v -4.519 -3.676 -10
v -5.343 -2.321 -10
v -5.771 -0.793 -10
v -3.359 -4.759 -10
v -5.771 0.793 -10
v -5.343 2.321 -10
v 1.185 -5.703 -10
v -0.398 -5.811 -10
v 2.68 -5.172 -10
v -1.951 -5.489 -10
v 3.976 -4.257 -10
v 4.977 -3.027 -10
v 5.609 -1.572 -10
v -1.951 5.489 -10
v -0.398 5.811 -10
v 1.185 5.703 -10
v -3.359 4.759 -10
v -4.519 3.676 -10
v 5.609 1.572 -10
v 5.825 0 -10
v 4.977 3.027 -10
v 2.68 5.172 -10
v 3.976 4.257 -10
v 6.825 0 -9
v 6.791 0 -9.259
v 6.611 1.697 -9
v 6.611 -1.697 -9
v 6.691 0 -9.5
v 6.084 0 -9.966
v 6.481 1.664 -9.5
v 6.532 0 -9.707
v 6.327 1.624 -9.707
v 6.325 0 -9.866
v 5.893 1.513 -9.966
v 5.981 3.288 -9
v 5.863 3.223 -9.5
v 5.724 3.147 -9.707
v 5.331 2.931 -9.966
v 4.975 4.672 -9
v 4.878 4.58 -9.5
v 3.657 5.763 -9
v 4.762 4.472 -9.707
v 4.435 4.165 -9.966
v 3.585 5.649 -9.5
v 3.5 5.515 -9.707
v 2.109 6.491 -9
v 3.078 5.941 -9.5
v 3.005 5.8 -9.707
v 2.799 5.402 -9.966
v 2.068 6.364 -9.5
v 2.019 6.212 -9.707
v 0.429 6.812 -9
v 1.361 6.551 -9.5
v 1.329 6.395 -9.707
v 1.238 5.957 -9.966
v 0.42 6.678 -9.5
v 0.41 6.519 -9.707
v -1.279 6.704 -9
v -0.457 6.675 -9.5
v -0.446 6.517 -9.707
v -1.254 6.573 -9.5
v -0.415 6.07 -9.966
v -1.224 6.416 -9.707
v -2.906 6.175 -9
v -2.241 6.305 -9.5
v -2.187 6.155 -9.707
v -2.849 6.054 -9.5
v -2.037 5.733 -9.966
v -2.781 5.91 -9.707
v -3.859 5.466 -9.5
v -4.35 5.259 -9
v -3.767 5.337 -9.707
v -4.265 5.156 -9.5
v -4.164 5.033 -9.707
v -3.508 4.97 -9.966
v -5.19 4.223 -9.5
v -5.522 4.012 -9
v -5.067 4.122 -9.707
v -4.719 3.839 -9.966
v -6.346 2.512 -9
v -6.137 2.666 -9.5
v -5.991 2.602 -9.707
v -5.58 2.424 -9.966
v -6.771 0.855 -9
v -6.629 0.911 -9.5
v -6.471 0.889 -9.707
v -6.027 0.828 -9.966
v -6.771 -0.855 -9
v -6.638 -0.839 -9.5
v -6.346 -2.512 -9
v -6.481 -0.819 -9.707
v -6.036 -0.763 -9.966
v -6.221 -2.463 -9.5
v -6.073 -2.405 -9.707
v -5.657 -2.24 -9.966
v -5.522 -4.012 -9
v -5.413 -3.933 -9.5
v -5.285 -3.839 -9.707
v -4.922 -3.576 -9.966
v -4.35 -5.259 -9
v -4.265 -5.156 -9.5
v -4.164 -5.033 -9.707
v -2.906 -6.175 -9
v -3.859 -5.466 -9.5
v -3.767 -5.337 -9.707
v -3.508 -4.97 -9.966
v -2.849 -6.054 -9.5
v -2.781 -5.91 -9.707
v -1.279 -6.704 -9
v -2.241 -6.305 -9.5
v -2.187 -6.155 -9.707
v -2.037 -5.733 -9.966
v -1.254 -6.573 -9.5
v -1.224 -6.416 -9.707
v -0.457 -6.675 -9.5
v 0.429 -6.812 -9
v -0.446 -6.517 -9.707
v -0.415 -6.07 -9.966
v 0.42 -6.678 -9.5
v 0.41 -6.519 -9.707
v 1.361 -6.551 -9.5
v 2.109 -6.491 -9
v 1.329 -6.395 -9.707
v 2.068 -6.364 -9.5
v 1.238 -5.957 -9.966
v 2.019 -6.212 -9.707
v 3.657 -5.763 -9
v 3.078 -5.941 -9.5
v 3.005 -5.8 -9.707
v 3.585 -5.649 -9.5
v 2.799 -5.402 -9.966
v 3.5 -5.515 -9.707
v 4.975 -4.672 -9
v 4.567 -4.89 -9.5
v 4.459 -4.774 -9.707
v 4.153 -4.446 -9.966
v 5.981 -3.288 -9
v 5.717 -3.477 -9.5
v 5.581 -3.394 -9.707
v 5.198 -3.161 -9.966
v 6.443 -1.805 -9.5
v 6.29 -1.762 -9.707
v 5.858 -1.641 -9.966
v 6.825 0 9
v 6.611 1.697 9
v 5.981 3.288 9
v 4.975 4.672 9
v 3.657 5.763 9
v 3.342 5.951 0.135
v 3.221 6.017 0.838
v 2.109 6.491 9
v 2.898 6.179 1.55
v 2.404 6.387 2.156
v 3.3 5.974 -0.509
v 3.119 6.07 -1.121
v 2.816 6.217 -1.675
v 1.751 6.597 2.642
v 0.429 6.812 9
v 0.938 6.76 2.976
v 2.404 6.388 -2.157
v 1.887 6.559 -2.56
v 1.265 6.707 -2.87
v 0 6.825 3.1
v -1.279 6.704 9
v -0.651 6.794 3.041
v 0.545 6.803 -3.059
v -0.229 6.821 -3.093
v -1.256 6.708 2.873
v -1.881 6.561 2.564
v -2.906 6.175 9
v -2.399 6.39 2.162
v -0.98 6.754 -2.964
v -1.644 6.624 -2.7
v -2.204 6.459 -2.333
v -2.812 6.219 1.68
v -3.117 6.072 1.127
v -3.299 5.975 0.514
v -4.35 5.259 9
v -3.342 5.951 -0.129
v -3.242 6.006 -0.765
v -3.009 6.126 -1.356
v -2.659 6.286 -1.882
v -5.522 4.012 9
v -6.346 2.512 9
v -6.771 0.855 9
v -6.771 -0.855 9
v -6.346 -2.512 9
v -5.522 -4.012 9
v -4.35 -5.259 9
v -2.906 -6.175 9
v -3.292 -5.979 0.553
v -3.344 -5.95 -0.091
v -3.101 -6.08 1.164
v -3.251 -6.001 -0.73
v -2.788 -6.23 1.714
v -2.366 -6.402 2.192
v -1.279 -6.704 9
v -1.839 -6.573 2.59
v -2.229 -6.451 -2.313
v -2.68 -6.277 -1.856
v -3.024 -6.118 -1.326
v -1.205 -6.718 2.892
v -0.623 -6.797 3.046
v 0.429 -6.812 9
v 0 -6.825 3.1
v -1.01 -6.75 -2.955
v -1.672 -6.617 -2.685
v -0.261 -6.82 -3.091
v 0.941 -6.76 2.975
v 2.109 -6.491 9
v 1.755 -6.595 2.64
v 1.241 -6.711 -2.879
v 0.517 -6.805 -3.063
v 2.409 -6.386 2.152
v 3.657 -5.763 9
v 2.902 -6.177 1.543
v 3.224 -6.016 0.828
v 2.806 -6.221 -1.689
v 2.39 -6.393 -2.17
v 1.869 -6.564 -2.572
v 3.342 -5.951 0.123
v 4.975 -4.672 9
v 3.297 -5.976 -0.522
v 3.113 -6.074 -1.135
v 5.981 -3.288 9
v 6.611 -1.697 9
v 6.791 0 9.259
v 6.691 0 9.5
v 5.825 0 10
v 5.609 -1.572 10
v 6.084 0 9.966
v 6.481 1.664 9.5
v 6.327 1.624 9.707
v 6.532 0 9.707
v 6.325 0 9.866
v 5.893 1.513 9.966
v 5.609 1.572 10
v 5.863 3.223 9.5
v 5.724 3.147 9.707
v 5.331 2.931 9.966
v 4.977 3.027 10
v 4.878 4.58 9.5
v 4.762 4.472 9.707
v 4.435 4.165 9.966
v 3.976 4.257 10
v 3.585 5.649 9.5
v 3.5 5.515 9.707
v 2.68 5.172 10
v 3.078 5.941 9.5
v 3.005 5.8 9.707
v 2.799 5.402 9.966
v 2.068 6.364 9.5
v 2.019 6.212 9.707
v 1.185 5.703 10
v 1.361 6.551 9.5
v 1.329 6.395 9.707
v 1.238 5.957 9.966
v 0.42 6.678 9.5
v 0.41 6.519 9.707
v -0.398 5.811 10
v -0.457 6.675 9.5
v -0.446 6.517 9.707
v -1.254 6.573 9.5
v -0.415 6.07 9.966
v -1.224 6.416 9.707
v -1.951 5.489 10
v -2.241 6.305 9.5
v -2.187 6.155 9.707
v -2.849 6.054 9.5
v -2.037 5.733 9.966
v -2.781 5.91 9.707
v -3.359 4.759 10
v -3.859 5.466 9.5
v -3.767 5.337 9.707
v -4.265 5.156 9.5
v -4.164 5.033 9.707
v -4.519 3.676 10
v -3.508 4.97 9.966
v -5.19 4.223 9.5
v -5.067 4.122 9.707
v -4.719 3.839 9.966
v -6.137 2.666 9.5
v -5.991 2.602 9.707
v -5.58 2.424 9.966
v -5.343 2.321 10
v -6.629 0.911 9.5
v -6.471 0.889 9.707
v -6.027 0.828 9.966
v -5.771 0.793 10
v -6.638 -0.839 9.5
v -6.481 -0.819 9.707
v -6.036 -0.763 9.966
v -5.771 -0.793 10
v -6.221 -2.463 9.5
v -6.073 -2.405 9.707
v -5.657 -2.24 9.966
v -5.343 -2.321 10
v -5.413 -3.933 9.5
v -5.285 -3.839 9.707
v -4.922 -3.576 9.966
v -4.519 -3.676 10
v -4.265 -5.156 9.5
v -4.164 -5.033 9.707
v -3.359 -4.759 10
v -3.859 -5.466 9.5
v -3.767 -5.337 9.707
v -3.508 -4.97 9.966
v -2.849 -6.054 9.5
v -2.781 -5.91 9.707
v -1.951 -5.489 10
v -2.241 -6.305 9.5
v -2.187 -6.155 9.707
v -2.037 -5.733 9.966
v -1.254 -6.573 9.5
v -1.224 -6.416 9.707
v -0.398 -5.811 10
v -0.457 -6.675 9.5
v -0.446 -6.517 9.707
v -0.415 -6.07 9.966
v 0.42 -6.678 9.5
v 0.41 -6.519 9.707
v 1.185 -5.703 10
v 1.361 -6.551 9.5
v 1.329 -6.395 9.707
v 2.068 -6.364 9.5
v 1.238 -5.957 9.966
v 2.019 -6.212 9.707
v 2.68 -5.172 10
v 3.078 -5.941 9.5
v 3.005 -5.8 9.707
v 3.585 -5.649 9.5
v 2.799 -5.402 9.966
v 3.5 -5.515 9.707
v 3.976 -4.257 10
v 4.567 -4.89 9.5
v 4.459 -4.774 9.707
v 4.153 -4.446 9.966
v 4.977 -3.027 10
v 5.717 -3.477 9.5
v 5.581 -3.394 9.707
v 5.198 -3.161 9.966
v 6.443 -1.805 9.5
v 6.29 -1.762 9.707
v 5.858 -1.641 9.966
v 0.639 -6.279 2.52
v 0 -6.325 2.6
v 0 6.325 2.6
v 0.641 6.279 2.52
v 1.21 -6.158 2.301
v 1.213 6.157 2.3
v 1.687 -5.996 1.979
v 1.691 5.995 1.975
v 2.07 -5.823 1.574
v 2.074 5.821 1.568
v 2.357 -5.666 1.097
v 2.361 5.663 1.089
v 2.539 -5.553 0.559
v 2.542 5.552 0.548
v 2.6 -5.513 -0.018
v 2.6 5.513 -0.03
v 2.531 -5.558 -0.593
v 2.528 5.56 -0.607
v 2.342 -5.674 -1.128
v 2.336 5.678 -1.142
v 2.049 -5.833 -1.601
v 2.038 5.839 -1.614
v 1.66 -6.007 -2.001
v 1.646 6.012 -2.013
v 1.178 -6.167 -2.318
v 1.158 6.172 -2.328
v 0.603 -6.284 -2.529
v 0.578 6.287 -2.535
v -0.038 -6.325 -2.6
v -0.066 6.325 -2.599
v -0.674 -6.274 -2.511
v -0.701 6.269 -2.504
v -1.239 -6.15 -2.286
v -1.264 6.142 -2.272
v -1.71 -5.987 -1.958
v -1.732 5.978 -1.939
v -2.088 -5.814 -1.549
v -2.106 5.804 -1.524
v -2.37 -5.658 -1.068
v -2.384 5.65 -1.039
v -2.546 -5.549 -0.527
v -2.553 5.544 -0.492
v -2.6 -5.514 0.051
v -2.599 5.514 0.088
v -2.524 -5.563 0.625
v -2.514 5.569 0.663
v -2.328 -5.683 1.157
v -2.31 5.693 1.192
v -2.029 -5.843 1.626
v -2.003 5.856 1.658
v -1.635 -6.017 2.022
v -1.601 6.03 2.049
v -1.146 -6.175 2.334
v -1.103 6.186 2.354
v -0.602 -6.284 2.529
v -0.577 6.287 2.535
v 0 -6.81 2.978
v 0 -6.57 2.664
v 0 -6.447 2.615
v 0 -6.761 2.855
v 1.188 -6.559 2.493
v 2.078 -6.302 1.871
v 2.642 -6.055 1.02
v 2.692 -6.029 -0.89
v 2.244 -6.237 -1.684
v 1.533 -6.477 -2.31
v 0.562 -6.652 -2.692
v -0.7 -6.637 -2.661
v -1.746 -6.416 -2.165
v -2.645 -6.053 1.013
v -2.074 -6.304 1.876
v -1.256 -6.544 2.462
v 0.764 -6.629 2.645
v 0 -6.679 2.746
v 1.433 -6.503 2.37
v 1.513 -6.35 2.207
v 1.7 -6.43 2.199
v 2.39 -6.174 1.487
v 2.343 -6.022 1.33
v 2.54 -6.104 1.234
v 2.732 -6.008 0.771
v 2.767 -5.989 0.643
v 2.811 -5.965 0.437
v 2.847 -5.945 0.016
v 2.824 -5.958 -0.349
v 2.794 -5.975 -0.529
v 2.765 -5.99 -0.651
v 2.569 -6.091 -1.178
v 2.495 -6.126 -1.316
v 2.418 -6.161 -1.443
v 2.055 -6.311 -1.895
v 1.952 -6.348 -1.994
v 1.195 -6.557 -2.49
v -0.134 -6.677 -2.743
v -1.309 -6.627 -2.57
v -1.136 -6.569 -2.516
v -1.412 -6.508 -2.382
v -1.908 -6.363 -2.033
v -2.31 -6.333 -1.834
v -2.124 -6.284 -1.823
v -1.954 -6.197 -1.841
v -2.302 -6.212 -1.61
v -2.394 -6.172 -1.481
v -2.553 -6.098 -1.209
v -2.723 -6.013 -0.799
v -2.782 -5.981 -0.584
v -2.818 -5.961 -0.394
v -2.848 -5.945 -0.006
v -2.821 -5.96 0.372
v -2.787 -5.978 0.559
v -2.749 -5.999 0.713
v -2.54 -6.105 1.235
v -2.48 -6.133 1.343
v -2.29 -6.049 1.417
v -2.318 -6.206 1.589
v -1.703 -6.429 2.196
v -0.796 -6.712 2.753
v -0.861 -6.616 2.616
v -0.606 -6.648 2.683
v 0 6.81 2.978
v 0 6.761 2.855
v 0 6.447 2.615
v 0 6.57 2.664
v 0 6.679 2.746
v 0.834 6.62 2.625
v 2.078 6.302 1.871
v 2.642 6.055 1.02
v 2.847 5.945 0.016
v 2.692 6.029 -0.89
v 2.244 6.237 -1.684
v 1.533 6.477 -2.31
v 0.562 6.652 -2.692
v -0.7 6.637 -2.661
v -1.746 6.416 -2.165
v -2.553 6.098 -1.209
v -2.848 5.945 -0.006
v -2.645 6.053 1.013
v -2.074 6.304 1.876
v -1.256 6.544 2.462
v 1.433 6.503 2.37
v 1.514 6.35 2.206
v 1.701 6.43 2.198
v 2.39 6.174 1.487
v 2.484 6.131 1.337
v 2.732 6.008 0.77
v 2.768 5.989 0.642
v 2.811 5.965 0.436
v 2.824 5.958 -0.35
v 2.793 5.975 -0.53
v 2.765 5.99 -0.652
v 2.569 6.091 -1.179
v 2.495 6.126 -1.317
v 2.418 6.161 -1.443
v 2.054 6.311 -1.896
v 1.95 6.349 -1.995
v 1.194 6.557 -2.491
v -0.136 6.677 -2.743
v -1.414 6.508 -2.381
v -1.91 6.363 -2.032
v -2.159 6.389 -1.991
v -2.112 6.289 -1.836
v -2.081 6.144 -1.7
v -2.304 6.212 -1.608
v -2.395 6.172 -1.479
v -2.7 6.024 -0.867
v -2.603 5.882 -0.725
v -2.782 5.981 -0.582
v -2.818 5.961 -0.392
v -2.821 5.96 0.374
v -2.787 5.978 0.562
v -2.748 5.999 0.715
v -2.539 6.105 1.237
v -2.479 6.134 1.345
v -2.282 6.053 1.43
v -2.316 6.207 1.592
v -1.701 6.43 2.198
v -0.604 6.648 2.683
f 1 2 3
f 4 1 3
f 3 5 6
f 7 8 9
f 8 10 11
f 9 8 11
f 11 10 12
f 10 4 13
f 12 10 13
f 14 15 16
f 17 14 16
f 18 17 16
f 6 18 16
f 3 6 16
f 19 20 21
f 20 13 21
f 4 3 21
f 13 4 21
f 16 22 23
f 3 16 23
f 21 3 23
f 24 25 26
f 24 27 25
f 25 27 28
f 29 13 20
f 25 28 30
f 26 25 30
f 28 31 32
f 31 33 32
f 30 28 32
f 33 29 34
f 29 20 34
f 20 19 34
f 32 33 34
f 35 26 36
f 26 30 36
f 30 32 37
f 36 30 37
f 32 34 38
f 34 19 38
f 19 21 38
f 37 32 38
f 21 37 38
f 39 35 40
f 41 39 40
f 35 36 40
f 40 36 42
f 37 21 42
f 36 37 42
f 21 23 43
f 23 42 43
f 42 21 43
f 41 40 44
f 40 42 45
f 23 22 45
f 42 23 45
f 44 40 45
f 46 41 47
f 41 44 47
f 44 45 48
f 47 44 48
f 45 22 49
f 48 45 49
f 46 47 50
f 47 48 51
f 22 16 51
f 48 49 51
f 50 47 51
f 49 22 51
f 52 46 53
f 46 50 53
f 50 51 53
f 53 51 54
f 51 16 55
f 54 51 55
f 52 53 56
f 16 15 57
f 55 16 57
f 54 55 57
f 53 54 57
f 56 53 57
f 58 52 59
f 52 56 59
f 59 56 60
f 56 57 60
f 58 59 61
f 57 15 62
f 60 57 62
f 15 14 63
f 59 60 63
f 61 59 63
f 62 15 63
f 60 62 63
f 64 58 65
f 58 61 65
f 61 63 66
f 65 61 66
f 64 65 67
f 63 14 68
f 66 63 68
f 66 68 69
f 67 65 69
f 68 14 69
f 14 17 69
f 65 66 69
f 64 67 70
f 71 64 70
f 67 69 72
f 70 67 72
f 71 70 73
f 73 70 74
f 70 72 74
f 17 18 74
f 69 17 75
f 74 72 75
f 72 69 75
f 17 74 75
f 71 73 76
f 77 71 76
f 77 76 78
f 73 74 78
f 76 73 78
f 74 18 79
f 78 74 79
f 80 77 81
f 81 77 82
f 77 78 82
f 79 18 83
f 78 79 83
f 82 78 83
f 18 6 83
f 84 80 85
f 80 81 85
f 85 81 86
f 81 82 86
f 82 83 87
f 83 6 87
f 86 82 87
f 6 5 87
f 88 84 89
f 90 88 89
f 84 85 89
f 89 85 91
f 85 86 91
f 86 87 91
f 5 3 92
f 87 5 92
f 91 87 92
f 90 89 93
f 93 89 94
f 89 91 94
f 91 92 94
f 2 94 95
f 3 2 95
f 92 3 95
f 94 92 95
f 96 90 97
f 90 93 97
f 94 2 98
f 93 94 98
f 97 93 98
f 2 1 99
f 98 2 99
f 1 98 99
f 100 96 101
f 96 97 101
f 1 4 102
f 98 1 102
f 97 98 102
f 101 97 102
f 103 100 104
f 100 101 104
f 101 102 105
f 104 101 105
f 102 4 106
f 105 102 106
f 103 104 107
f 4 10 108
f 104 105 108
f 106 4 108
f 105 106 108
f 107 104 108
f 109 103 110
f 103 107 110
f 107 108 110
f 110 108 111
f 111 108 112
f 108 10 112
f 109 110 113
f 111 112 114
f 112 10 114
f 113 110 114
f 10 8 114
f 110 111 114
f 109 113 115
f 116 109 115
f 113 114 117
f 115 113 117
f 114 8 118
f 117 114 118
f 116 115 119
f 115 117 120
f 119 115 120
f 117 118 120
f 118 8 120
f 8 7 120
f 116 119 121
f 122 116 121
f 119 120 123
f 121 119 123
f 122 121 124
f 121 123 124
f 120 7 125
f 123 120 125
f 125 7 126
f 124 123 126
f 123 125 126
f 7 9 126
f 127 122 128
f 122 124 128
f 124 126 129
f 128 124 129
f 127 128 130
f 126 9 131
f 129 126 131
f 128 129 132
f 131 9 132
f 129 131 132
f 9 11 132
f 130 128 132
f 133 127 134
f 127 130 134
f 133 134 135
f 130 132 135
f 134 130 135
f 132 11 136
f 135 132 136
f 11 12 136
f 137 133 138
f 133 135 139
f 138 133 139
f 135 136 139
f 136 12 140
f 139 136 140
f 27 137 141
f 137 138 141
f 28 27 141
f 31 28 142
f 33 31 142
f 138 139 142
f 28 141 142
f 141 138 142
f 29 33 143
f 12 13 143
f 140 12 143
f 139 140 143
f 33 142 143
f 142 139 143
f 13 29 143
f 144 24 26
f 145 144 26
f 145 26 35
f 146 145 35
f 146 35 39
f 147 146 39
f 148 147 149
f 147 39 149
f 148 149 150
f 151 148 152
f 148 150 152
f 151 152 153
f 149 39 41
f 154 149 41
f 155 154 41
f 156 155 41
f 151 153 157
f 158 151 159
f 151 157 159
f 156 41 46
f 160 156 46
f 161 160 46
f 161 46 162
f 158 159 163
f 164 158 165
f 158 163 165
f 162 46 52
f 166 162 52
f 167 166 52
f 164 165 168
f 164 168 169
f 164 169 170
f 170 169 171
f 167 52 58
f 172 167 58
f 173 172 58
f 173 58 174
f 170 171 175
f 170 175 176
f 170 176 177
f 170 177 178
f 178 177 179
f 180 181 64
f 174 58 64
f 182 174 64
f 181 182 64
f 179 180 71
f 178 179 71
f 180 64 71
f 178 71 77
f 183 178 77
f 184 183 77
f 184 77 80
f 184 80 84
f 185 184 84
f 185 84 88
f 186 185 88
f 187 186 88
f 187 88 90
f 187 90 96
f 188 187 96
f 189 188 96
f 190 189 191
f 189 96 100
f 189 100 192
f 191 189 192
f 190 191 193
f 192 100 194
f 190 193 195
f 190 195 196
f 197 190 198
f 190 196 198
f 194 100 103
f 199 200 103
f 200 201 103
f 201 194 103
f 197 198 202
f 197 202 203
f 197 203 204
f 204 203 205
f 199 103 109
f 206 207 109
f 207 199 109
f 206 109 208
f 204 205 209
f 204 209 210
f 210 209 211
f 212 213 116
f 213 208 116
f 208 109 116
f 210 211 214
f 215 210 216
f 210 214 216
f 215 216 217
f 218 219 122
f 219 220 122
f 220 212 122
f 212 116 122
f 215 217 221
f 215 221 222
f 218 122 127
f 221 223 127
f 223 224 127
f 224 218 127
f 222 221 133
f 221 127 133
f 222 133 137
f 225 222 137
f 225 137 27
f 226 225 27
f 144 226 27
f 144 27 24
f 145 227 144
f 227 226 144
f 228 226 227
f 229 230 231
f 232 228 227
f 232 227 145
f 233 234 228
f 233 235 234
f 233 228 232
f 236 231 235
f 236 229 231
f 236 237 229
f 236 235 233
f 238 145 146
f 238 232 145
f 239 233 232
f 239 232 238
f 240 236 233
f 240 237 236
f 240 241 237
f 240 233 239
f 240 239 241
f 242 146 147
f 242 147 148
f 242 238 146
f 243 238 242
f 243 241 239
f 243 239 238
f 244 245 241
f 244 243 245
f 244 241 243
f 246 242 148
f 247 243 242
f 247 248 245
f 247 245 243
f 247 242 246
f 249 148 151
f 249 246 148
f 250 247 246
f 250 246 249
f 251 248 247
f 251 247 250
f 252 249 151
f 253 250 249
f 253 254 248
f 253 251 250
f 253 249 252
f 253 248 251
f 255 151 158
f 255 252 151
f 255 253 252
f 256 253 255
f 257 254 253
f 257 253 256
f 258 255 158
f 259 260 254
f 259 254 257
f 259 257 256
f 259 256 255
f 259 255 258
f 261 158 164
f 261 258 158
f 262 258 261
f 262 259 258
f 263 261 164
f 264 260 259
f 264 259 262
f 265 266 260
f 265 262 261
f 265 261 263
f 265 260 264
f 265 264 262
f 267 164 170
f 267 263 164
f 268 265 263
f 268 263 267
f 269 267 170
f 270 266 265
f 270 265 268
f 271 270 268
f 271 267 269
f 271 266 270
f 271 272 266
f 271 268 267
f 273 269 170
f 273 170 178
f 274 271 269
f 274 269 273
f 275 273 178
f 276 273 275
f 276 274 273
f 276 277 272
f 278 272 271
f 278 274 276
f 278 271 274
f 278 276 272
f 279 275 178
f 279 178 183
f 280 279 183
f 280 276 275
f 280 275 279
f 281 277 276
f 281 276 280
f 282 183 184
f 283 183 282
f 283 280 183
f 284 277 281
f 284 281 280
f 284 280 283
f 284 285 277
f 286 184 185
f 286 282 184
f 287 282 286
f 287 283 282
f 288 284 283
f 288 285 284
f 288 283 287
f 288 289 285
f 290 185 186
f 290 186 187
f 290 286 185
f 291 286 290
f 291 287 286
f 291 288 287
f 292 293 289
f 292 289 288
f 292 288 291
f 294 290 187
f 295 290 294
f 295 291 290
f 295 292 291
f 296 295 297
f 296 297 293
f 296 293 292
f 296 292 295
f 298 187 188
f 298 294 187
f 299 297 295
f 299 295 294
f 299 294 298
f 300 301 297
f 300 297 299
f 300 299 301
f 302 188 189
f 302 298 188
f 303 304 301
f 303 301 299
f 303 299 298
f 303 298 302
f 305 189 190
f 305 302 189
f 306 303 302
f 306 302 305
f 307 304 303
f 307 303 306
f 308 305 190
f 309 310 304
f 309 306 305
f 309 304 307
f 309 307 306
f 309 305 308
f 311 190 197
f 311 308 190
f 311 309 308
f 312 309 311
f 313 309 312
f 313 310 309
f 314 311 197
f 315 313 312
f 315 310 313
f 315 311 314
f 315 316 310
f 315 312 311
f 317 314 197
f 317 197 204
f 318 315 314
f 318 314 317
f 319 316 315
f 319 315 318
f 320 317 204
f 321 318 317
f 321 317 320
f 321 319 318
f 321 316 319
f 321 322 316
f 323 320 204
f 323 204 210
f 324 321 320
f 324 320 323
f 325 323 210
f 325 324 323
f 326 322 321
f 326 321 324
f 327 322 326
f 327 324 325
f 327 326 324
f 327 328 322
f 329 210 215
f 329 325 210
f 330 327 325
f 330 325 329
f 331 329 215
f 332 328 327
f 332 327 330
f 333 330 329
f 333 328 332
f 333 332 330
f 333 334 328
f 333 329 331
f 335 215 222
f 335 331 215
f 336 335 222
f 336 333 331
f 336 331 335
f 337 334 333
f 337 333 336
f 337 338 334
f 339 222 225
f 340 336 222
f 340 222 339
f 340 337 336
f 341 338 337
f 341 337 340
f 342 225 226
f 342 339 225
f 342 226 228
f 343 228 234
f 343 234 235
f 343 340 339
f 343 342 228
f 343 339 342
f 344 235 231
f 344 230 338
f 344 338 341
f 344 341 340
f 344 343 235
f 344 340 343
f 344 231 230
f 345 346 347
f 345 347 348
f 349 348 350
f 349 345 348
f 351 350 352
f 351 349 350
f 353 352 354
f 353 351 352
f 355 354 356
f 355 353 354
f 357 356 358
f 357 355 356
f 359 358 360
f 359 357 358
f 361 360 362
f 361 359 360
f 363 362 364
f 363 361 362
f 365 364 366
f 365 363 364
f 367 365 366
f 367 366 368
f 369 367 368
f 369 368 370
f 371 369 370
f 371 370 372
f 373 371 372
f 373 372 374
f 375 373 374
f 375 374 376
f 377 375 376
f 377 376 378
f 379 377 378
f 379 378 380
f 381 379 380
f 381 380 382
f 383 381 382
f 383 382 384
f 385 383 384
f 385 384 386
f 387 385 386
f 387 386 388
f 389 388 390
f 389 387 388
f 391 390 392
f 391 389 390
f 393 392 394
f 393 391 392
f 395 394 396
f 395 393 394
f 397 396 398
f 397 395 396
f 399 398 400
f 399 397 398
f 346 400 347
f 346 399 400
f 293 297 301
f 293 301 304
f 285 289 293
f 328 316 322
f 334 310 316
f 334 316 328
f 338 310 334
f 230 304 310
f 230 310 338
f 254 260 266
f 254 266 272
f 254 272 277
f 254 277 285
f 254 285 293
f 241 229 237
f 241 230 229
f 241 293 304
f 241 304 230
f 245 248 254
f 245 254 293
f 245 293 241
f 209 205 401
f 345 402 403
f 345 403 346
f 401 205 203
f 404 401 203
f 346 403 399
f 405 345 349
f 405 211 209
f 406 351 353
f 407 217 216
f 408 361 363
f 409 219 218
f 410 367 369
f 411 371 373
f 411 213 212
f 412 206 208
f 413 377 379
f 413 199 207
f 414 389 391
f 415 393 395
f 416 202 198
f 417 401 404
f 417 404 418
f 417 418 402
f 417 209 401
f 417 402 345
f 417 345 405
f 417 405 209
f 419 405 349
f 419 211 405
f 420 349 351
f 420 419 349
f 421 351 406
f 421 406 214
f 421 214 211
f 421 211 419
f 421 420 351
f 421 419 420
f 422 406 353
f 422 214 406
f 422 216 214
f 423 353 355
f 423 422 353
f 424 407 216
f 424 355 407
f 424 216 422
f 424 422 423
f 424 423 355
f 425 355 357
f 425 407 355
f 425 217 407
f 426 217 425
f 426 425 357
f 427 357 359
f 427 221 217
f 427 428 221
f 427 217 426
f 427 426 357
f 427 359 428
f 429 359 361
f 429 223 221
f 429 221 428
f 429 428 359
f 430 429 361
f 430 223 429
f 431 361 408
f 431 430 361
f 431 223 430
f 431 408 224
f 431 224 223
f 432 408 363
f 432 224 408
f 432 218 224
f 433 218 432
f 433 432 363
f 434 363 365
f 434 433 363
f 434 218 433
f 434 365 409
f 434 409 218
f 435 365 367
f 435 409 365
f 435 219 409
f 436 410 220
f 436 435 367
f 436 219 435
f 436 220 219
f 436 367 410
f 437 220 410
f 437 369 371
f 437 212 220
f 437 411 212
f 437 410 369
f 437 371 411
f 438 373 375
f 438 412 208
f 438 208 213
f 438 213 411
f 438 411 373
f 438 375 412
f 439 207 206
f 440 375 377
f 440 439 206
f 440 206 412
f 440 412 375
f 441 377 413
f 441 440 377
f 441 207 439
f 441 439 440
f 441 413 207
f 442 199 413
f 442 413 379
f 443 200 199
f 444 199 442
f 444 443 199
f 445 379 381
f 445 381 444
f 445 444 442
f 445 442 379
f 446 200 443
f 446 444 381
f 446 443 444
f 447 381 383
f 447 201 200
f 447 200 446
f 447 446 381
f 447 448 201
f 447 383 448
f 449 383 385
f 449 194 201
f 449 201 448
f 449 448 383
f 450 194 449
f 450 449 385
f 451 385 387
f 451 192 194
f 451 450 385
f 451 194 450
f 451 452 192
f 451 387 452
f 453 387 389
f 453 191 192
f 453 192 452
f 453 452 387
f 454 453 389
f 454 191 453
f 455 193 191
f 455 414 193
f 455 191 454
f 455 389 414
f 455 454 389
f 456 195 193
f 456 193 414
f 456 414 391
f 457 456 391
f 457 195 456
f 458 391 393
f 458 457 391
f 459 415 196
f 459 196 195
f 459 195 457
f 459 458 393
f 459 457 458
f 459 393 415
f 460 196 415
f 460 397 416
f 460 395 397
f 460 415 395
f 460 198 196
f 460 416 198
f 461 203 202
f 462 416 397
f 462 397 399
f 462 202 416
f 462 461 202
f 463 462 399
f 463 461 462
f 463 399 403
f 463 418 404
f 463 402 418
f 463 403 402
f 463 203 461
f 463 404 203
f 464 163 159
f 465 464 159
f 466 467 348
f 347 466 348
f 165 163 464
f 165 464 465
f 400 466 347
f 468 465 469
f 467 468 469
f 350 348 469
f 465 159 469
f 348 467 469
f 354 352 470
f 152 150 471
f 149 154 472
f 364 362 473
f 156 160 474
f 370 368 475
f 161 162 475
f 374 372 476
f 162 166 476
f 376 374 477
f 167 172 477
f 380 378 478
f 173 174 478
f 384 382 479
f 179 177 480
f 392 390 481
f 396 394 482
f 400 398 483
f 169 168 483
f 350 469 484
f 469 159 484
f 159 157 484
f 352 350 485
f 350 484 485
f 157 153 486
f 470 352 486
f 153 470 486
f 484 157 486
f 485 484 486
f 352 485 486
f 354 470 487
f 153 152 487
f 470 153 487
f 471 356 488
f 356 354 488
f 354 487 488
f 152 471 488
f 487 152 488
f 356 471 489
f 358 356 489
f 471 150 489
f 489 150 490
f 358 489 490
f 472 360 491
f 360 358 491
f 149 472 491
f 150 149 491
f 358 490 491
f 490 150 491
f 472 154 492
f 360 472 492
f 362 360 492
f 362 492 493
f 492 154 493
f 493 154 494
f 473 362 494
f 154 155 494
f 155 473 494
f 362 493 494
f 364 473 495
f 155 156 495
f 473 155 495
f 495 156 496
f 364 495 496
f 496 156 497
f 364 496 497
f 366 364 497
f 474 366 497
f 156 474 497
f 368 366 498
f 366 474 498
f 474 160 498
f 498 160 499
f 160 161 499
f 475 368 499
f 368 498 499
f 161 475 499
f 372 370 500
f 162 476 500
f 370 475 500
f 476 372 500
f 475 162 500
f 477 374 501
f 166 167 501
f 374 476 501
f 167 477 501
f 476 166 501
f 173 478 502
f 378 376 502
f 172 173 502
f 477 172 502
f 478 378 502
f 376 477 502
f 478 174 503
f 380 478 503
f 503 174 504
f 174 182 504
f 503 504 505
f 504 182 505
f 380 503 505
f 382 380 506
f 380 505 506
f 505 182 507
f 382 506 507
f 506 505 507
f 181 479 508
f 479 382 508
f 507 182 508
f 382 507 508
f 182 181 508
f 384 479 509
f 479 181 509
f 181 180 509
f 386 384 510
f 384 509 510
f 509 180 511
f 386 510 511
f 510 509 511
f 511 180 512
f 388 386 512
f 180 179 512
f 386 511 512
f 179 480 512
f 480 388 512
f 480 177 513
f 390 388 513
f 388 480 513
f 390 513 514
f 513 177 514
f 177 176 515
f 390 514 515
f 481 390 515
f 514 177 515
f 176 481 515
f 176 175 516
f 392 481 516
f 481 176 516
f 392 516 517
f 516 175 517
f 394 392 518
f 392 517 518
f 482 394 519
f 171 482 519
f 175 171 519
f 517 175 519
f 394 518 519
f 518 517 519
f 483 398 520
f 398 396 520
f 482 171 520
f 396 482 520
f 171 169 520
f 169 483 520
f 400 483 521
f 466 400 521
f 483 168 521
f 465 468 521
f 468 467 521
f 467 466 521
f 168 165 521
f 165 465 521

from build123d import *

# Parameters (mm, degrees)
BOSS_EXTRUDE1_DEPTH      = 10
BOSS_EXTRUDE1_DEPTH_BACK = 10
SKETCH1_R                = 6.825
CUT_EXTRUDE1_DEPTH       = 14.898246292
CUT_EXTRUDE1_DEPTH_BACK  = 14.898246292
SKETCH2_R                = 2.6
FILLET1_R                = 1
FILLET2_R                = 0.5


with BuildPart() as part:
    # Sketch1 → Boss-Extrude1 (new, two sides: drawn at the far end of the back side and taken through both)
    with BuildSketch(Plane.XY.offset(-BOSS_EXTRUDE1_DEPTH_BACK)):
        Circle(SKETCH1_R)
    extrude(amount=BOSS_EXTRUDE1_DEPTH + BOSS_EXTRUDE1_DEPTH_BACK)

    # Sketch2 → Cut-Extrude1 (cut, two sides: drawn at the far end of the back side and taken through both)
    with BuildSketch(Plane(origin=(0, 0, 0), x_dir=(1, 0, 0), z_dir=(0, 1, 0)).offset(-CUT_EXTRUDE1_DEPTH_BACK)):
        Circle(SKETCH2_R)
    extrude(amount=CUT_EXTRUDE1_DEPTH + CUT_EXTRUDE1_DEPTH_BACK, mode=Mode.SUBTRACT)

    # Fillet1
    fillet1_edges = [part.edges().sort_by_distance(p)[0] for p in [
        (-6.825, 0, -10),
        (-6.825, 0, 10),
    ]]
    fillet(fillet1_edges, radius=FILLET1_R)

    # Fillet2
    fillet2_edges = [part.edges().sort_by_distance(p)[0] for p in [
        (1e-09, -6.825, -2.600000001),
        (1e-09, 6.825, -2.600000001),
    ]]
    fillet(fillet2_edges, radius=FILLET2_R)


solid = part.part
